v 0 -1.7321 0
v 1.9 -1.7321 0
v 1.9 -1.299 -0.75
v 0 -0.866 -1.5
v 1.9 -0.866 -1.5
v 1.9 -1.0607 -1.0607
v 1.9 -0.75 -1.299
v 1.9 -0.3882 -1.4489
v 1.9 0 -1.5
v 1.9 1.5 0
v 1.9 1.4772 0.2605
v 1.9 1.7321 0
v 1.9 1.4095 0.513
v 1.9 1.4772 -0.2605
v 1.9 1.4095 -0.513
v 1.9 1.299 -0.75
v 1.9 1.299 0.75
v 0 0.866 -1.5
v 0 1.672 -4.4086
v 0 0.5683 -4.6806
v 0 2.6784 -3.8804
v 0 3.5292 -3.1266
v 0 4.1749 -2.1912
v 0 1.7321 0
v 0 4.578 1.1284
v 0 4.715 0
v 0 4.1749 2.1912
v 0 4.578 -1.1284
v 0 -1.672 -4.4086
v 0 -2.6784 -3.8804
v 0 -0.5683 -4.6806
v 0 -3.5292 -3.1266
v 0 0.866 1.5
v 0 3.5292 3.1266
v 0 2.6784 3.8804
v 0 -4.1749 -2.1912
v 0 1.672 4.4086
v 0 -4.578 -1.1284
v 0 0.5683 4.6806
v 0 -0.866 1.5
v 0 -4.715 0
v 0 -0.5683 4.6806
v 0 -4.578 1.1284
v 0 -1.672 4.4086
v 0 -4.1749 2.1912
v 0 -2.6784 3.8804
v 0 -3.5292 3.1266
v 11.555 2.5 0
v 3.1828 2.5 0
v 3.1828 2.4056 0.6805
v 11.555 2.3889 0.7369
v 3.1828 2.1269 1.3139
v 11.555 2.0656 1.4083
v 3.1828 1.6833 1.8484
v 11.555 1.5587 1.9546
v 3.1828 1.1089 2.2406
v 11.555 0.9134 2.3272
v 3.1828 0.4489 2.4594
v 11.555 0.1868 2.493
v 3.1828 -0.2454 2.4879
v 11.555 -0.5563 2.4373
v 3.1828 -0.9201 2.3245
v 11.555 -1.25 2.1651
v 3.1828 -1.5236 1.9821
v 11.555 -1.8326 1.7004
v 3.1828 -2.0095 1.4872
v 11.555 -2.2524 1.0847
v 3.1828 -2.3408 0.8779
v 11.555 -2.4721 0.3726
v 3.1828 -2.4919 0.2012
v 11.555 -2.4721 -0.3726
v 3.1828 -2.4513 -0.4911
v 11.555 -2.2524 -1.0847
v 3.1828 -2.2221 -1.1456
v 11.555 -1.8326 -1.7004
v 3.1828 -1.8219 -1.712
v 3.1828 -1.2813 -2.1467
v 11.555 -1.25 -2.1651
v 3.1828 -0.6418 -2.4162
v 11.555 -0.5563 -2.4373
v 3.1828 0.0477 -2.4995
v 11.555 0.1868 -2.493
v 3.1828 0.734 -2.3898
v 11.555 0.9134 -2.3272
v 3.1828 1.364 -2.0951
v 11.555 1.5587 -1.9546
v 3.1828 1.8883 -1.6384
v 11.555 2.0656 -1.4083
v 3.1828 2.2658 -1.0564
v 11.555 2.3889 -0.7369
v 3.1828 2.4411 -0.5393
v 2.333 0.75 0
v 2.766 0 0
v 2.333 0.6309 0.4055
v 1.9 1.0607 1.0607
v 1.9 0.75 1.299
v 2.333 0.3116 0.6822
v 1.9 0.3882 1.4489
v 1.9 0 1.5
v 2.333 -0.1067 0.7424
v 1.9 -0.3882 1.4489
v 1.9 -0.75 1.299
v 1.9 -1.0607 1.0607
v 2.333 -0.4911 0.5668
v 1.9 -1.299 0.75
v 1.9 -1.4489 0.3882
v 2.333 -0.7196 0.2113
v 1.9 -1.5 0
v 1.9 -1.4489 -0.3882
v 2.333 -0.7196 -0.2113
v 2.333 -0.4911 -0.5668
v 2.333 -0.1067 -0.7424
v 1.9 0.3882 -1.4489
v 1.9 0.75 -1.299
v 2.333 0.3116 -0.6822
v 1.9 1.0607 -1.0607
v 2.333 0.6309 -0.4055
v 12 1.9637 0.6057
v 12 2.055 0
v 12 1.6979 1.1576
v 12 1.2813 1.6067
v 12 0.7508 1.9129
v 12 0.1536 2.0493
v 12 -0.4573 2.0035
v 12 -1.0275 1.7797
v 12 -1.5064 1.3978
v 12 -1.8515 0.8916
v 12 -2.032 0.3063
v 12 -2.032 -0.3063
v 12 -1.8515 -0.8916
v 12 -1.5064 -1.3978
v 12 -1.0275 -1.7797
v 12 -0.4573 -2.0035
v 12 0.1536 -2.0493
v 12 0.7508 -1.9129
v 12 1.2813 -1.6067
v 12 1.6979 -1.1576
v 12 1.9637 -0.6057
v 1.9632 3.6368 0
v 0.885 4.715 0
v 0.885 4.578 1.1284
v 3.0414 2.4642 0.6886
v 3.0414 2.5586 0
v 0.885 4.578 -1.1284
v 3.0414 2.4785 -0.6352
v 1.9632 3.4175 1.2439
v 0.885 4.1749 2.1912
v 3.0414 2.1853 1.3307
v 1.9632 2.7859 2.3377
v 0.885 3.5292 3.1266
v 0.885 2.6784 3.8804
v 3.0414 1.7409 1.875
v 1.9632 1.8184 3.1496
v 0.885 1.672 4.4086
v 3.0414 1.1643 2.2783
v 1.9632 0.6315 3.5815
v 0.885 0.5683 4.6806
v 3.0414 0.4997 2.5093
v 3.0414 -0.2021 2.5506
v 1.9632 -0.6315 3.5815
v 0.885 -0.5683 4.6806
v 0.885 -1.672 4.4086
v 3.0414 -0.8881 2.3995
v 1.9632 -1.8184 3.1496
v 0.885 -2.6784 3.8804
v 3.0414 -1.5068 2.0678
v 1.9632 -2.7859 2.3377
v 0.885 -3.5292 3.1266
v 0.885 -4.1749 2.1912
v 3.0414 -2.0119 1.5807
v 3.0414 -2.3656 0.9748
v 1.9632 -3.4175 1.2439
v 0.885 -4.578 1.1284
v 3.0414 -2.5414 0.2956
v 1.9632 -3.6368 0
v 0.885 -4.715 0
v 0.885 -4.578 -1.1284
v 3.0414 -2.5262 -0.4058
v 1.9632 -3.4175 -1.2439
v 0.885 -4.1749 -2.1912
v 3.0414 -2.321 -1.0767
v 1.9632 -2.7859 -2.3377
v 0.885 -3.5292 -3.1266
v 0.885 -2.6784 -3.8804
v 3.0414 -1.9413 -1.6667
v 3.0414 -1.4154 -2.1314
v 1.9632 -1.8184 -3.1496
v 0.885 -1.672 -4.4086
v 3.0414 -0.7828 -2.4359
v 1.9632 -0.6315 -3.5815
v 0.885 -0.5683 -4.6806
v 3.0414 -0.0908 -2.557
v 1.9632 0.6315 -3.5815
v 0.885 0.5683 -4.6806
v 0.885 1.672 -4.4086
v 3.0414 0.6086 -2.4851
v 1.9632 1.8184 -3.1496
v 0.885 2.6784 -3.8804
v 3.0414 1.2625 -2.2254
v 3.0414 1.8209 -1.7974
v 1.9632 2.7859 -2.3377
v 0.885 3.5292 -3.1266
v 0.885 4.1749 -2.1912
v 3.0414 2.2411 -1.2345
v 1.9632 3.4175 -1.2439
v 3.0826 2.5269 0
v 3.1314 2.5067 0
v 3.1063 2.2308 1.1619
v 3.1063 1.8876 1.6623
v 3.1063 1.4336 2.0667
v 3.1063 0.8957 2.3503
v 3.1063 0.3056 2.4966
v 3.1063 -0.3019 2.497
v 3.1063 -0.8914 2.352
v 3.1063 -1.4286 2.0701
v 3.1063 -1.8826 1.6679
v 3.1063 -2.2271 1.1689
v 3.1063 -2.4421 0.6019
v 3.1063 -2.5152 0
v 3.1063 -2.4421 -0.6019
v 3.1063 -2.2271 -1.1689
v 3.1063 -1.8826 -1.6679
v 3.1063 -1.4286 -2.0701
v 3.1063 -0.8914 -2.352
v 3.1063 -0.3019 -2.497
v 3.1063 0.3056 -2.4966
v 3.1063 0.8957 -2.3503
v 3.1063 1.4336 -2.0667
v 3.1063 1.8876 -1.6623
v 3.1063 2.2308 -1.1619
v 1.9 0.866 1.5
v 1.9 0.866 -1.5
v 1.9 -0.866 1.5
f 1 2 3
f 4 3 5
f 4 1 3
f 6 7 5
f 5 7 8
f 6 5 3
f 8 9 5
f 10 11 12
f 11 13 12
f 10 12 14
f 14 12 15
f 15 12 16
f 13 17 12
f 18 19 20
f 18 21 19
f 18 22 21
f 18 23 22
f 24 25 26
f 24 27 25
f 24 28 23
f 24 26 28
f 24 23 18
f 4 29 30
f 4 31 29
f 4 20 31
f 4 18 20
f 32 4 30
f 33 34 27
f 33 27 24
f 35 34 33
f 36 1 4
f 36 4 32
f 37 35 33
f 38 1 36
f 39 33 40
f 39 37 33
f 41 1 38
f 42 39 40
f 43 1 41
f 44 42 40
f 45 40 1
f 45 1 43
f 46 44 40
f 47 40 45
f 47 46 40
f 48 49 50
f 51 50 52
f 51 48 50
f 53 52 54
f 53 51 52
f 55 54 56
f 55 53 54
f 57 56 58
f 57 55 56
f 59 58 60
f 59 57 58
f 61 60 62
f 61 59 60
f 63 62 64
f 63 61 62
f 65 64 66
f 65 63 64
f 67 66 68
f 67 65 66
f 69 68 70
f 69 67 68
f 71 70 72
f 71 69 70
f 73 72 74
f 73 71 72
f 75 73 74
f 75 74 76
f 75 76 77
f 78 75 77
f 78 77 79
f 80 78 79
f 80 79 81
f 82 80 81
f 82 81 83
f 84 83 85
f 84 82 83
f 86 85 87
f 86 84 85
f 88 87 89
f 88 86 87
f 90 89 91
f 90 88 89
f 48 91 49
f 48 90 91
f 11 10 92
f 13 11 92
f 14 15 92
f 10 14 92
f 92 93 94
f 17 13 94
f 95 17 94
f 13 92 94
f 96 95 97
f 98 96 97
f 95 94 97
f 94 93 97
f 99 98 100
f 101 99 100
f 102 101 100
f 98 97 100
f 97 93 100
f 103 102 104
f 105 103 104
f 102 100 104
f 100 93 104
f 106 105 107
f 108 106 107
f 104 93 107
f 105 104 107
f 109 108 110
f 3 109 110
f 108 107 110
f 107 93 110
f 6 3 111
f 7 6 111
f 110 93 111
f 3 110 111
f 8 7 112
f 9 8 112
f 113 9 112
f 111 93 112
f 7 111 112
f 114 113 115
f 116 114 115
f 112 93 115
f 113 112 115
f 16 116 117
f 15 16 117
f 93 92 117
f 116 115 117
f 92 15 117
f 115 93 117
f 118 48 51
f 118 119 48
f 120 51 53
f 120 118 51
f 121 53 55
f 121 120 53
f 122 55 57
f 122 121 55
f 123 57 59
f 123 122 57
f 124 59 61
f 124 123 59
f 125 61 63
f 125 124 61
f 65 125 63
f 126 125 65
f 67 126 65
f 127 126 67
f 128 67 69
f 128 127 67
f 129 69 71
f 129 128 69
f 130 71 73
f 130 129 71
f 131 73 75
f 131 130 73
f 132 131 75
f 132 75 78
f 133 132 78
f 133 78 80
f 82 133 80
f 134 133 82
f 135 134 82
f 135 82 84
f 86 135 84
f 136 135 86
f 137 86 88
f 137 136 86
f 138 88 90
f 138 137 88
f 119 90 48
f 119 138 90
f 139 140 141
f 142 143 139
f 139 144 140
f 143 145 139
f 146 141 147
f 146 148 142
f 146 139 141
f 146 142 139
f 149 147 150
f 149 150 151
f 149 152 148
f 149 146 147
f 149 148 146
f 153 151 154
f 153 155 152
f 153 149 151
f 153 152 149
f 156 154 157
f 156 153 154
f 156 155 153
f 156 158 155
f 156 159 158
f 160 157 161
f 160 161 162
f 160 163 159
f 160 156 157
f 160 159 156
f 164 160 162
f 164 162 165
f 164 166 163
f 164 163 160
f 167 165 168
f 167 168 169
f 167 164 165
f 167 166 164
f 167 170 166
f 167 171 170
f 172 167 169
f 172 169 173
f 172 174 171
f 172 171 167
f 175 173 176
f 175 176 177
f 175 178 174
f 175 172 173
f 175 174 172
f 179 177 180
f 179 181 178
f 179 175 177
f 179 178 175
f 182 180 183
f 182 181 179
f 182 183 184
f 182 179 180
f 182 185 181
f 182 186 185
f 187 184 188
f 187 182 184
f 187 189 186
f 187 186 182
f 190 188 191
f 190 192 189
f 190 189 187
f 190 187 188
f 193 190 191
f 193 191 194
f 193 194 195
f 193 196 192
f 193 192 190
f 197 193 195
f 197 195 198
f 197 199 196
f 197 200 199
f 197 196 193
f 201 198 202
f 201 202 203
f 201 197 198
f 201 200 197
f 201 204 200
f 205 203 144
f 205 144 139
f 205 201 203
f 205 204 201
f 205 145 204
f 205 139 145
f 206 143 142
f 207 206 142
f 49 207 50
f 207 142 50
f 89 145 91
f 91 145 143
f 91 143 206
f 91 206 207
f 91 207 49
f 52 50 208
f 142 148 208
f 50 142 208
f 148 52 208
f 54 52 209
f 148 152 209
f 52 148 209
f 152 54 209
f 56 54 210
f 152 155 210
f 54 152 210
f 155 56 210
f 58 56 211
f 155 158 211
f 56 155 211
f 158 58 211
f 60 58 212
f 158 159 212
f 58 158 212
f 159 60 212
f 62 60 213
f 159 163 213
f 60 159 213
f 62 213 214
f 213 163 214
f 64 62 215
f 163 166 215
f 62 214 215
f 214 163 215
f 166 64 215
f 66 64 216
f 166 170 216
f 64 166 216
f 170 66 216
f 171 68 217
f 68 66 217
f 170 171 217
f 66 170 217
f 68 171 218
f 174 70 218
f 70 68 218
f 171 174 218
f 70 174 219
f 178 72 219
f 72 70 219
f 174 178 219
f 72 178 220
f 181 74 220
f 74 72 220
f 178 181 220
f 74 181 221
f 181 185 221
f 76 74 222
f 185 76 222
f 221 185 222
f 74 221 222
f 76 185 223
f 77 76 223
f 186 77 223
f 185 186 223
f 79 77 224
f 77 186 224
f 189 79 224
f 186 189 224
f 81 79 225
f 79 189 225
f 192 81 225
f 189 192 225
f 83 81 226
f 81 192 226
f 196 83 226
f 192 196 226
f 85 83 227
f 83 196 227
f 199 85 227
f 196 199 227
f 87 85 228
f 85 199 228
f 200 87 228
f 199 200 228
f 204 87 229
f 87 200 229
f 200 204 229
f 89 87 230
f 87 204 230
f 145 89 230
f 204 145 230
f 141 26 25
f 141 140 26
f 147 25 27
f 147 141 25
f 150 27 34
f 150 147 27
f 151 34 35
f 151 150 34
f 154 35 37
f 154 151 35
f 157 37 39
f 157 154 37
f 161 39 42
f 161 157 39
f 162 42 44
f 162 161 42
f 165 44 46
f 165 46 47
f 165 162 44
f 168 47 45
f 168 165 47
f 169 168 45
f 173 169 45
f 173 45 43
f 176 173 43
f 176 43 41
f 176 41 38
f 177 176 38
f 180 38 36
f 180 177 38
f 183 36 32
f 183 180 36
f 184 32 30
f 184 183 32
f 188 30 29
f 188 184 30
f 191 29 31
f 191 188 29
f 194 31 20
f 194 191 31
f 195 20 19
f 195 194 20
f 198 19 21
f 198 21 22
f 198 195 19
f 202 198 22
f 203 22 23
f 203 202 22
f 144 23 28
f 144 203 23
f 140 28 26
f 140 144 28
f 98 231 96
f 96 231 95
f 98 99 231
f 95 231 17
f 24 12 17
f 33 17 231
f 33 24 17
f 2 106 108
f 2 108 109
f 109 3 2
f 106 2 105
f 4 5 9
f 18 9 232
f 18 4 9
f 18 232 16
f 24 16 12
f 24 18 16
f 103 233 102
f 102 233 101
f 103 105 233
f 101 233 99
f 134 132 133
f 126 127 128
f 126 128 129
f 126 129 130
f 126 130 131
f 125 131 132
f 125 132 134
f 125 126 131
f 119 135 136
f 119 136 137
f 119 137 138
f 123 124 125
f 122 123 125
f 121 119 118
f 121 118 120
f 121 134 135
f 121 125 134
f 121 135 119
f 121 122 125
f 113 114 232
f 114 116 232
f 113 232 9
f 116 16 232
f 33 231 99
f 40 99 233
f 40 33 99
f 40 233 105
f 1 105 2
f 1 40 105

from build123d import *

# Parameters (mm, degrees)
FILLET1_R   = 0.2
HEX_2_DEPTH = 1.9


with BuildPart() as part:
    # BodySke → BaseBody (revolve)
    with BuildSketch(Plane.XY):
        Polygon((0, 0), (0, 4.715), (0.885, 4.715), (3.1, 2.5), (11.555, 2.5), (12, 2.055), (12, 0), align=None)
    revolve(axis=Axis((0, 0, 0), (1, 0, 0)))

    # Fillet1
    fillet1_edges = [part.edges().sort_by_distance(p)[0] for p in [
        (3.1, -2.5, 0),
    ]]
    fillet(fillet1_edges, radius=FILLET1_R)

    # Sketch2 → PreBroach (revolve, cut)
    with BuildSketch(Plane.XY):
        Polygon((0, 1.5), (1.9, 1.5), (2.766025404, 0), (0, 0), align=None)
    revolve(axis=Axis((0, 0, 0), (1, 0, 0)), mode=Mode.SUBTRACT)

    # Sketch3 → Hex 2 (cut)
    with BuildSketch(Plane.ZY):
        Polygon((-1.5, -0.866025404), (-1.5, 0.866025404), (0, 1.732050808), (1.5, 0.866025404), (1.5, -0.866025404), (0, -1.732050808), align=None)
    extrude(amount=-HEX_2_DEPTH, mode=Mode.SUBTRACT)


solid = part.part
